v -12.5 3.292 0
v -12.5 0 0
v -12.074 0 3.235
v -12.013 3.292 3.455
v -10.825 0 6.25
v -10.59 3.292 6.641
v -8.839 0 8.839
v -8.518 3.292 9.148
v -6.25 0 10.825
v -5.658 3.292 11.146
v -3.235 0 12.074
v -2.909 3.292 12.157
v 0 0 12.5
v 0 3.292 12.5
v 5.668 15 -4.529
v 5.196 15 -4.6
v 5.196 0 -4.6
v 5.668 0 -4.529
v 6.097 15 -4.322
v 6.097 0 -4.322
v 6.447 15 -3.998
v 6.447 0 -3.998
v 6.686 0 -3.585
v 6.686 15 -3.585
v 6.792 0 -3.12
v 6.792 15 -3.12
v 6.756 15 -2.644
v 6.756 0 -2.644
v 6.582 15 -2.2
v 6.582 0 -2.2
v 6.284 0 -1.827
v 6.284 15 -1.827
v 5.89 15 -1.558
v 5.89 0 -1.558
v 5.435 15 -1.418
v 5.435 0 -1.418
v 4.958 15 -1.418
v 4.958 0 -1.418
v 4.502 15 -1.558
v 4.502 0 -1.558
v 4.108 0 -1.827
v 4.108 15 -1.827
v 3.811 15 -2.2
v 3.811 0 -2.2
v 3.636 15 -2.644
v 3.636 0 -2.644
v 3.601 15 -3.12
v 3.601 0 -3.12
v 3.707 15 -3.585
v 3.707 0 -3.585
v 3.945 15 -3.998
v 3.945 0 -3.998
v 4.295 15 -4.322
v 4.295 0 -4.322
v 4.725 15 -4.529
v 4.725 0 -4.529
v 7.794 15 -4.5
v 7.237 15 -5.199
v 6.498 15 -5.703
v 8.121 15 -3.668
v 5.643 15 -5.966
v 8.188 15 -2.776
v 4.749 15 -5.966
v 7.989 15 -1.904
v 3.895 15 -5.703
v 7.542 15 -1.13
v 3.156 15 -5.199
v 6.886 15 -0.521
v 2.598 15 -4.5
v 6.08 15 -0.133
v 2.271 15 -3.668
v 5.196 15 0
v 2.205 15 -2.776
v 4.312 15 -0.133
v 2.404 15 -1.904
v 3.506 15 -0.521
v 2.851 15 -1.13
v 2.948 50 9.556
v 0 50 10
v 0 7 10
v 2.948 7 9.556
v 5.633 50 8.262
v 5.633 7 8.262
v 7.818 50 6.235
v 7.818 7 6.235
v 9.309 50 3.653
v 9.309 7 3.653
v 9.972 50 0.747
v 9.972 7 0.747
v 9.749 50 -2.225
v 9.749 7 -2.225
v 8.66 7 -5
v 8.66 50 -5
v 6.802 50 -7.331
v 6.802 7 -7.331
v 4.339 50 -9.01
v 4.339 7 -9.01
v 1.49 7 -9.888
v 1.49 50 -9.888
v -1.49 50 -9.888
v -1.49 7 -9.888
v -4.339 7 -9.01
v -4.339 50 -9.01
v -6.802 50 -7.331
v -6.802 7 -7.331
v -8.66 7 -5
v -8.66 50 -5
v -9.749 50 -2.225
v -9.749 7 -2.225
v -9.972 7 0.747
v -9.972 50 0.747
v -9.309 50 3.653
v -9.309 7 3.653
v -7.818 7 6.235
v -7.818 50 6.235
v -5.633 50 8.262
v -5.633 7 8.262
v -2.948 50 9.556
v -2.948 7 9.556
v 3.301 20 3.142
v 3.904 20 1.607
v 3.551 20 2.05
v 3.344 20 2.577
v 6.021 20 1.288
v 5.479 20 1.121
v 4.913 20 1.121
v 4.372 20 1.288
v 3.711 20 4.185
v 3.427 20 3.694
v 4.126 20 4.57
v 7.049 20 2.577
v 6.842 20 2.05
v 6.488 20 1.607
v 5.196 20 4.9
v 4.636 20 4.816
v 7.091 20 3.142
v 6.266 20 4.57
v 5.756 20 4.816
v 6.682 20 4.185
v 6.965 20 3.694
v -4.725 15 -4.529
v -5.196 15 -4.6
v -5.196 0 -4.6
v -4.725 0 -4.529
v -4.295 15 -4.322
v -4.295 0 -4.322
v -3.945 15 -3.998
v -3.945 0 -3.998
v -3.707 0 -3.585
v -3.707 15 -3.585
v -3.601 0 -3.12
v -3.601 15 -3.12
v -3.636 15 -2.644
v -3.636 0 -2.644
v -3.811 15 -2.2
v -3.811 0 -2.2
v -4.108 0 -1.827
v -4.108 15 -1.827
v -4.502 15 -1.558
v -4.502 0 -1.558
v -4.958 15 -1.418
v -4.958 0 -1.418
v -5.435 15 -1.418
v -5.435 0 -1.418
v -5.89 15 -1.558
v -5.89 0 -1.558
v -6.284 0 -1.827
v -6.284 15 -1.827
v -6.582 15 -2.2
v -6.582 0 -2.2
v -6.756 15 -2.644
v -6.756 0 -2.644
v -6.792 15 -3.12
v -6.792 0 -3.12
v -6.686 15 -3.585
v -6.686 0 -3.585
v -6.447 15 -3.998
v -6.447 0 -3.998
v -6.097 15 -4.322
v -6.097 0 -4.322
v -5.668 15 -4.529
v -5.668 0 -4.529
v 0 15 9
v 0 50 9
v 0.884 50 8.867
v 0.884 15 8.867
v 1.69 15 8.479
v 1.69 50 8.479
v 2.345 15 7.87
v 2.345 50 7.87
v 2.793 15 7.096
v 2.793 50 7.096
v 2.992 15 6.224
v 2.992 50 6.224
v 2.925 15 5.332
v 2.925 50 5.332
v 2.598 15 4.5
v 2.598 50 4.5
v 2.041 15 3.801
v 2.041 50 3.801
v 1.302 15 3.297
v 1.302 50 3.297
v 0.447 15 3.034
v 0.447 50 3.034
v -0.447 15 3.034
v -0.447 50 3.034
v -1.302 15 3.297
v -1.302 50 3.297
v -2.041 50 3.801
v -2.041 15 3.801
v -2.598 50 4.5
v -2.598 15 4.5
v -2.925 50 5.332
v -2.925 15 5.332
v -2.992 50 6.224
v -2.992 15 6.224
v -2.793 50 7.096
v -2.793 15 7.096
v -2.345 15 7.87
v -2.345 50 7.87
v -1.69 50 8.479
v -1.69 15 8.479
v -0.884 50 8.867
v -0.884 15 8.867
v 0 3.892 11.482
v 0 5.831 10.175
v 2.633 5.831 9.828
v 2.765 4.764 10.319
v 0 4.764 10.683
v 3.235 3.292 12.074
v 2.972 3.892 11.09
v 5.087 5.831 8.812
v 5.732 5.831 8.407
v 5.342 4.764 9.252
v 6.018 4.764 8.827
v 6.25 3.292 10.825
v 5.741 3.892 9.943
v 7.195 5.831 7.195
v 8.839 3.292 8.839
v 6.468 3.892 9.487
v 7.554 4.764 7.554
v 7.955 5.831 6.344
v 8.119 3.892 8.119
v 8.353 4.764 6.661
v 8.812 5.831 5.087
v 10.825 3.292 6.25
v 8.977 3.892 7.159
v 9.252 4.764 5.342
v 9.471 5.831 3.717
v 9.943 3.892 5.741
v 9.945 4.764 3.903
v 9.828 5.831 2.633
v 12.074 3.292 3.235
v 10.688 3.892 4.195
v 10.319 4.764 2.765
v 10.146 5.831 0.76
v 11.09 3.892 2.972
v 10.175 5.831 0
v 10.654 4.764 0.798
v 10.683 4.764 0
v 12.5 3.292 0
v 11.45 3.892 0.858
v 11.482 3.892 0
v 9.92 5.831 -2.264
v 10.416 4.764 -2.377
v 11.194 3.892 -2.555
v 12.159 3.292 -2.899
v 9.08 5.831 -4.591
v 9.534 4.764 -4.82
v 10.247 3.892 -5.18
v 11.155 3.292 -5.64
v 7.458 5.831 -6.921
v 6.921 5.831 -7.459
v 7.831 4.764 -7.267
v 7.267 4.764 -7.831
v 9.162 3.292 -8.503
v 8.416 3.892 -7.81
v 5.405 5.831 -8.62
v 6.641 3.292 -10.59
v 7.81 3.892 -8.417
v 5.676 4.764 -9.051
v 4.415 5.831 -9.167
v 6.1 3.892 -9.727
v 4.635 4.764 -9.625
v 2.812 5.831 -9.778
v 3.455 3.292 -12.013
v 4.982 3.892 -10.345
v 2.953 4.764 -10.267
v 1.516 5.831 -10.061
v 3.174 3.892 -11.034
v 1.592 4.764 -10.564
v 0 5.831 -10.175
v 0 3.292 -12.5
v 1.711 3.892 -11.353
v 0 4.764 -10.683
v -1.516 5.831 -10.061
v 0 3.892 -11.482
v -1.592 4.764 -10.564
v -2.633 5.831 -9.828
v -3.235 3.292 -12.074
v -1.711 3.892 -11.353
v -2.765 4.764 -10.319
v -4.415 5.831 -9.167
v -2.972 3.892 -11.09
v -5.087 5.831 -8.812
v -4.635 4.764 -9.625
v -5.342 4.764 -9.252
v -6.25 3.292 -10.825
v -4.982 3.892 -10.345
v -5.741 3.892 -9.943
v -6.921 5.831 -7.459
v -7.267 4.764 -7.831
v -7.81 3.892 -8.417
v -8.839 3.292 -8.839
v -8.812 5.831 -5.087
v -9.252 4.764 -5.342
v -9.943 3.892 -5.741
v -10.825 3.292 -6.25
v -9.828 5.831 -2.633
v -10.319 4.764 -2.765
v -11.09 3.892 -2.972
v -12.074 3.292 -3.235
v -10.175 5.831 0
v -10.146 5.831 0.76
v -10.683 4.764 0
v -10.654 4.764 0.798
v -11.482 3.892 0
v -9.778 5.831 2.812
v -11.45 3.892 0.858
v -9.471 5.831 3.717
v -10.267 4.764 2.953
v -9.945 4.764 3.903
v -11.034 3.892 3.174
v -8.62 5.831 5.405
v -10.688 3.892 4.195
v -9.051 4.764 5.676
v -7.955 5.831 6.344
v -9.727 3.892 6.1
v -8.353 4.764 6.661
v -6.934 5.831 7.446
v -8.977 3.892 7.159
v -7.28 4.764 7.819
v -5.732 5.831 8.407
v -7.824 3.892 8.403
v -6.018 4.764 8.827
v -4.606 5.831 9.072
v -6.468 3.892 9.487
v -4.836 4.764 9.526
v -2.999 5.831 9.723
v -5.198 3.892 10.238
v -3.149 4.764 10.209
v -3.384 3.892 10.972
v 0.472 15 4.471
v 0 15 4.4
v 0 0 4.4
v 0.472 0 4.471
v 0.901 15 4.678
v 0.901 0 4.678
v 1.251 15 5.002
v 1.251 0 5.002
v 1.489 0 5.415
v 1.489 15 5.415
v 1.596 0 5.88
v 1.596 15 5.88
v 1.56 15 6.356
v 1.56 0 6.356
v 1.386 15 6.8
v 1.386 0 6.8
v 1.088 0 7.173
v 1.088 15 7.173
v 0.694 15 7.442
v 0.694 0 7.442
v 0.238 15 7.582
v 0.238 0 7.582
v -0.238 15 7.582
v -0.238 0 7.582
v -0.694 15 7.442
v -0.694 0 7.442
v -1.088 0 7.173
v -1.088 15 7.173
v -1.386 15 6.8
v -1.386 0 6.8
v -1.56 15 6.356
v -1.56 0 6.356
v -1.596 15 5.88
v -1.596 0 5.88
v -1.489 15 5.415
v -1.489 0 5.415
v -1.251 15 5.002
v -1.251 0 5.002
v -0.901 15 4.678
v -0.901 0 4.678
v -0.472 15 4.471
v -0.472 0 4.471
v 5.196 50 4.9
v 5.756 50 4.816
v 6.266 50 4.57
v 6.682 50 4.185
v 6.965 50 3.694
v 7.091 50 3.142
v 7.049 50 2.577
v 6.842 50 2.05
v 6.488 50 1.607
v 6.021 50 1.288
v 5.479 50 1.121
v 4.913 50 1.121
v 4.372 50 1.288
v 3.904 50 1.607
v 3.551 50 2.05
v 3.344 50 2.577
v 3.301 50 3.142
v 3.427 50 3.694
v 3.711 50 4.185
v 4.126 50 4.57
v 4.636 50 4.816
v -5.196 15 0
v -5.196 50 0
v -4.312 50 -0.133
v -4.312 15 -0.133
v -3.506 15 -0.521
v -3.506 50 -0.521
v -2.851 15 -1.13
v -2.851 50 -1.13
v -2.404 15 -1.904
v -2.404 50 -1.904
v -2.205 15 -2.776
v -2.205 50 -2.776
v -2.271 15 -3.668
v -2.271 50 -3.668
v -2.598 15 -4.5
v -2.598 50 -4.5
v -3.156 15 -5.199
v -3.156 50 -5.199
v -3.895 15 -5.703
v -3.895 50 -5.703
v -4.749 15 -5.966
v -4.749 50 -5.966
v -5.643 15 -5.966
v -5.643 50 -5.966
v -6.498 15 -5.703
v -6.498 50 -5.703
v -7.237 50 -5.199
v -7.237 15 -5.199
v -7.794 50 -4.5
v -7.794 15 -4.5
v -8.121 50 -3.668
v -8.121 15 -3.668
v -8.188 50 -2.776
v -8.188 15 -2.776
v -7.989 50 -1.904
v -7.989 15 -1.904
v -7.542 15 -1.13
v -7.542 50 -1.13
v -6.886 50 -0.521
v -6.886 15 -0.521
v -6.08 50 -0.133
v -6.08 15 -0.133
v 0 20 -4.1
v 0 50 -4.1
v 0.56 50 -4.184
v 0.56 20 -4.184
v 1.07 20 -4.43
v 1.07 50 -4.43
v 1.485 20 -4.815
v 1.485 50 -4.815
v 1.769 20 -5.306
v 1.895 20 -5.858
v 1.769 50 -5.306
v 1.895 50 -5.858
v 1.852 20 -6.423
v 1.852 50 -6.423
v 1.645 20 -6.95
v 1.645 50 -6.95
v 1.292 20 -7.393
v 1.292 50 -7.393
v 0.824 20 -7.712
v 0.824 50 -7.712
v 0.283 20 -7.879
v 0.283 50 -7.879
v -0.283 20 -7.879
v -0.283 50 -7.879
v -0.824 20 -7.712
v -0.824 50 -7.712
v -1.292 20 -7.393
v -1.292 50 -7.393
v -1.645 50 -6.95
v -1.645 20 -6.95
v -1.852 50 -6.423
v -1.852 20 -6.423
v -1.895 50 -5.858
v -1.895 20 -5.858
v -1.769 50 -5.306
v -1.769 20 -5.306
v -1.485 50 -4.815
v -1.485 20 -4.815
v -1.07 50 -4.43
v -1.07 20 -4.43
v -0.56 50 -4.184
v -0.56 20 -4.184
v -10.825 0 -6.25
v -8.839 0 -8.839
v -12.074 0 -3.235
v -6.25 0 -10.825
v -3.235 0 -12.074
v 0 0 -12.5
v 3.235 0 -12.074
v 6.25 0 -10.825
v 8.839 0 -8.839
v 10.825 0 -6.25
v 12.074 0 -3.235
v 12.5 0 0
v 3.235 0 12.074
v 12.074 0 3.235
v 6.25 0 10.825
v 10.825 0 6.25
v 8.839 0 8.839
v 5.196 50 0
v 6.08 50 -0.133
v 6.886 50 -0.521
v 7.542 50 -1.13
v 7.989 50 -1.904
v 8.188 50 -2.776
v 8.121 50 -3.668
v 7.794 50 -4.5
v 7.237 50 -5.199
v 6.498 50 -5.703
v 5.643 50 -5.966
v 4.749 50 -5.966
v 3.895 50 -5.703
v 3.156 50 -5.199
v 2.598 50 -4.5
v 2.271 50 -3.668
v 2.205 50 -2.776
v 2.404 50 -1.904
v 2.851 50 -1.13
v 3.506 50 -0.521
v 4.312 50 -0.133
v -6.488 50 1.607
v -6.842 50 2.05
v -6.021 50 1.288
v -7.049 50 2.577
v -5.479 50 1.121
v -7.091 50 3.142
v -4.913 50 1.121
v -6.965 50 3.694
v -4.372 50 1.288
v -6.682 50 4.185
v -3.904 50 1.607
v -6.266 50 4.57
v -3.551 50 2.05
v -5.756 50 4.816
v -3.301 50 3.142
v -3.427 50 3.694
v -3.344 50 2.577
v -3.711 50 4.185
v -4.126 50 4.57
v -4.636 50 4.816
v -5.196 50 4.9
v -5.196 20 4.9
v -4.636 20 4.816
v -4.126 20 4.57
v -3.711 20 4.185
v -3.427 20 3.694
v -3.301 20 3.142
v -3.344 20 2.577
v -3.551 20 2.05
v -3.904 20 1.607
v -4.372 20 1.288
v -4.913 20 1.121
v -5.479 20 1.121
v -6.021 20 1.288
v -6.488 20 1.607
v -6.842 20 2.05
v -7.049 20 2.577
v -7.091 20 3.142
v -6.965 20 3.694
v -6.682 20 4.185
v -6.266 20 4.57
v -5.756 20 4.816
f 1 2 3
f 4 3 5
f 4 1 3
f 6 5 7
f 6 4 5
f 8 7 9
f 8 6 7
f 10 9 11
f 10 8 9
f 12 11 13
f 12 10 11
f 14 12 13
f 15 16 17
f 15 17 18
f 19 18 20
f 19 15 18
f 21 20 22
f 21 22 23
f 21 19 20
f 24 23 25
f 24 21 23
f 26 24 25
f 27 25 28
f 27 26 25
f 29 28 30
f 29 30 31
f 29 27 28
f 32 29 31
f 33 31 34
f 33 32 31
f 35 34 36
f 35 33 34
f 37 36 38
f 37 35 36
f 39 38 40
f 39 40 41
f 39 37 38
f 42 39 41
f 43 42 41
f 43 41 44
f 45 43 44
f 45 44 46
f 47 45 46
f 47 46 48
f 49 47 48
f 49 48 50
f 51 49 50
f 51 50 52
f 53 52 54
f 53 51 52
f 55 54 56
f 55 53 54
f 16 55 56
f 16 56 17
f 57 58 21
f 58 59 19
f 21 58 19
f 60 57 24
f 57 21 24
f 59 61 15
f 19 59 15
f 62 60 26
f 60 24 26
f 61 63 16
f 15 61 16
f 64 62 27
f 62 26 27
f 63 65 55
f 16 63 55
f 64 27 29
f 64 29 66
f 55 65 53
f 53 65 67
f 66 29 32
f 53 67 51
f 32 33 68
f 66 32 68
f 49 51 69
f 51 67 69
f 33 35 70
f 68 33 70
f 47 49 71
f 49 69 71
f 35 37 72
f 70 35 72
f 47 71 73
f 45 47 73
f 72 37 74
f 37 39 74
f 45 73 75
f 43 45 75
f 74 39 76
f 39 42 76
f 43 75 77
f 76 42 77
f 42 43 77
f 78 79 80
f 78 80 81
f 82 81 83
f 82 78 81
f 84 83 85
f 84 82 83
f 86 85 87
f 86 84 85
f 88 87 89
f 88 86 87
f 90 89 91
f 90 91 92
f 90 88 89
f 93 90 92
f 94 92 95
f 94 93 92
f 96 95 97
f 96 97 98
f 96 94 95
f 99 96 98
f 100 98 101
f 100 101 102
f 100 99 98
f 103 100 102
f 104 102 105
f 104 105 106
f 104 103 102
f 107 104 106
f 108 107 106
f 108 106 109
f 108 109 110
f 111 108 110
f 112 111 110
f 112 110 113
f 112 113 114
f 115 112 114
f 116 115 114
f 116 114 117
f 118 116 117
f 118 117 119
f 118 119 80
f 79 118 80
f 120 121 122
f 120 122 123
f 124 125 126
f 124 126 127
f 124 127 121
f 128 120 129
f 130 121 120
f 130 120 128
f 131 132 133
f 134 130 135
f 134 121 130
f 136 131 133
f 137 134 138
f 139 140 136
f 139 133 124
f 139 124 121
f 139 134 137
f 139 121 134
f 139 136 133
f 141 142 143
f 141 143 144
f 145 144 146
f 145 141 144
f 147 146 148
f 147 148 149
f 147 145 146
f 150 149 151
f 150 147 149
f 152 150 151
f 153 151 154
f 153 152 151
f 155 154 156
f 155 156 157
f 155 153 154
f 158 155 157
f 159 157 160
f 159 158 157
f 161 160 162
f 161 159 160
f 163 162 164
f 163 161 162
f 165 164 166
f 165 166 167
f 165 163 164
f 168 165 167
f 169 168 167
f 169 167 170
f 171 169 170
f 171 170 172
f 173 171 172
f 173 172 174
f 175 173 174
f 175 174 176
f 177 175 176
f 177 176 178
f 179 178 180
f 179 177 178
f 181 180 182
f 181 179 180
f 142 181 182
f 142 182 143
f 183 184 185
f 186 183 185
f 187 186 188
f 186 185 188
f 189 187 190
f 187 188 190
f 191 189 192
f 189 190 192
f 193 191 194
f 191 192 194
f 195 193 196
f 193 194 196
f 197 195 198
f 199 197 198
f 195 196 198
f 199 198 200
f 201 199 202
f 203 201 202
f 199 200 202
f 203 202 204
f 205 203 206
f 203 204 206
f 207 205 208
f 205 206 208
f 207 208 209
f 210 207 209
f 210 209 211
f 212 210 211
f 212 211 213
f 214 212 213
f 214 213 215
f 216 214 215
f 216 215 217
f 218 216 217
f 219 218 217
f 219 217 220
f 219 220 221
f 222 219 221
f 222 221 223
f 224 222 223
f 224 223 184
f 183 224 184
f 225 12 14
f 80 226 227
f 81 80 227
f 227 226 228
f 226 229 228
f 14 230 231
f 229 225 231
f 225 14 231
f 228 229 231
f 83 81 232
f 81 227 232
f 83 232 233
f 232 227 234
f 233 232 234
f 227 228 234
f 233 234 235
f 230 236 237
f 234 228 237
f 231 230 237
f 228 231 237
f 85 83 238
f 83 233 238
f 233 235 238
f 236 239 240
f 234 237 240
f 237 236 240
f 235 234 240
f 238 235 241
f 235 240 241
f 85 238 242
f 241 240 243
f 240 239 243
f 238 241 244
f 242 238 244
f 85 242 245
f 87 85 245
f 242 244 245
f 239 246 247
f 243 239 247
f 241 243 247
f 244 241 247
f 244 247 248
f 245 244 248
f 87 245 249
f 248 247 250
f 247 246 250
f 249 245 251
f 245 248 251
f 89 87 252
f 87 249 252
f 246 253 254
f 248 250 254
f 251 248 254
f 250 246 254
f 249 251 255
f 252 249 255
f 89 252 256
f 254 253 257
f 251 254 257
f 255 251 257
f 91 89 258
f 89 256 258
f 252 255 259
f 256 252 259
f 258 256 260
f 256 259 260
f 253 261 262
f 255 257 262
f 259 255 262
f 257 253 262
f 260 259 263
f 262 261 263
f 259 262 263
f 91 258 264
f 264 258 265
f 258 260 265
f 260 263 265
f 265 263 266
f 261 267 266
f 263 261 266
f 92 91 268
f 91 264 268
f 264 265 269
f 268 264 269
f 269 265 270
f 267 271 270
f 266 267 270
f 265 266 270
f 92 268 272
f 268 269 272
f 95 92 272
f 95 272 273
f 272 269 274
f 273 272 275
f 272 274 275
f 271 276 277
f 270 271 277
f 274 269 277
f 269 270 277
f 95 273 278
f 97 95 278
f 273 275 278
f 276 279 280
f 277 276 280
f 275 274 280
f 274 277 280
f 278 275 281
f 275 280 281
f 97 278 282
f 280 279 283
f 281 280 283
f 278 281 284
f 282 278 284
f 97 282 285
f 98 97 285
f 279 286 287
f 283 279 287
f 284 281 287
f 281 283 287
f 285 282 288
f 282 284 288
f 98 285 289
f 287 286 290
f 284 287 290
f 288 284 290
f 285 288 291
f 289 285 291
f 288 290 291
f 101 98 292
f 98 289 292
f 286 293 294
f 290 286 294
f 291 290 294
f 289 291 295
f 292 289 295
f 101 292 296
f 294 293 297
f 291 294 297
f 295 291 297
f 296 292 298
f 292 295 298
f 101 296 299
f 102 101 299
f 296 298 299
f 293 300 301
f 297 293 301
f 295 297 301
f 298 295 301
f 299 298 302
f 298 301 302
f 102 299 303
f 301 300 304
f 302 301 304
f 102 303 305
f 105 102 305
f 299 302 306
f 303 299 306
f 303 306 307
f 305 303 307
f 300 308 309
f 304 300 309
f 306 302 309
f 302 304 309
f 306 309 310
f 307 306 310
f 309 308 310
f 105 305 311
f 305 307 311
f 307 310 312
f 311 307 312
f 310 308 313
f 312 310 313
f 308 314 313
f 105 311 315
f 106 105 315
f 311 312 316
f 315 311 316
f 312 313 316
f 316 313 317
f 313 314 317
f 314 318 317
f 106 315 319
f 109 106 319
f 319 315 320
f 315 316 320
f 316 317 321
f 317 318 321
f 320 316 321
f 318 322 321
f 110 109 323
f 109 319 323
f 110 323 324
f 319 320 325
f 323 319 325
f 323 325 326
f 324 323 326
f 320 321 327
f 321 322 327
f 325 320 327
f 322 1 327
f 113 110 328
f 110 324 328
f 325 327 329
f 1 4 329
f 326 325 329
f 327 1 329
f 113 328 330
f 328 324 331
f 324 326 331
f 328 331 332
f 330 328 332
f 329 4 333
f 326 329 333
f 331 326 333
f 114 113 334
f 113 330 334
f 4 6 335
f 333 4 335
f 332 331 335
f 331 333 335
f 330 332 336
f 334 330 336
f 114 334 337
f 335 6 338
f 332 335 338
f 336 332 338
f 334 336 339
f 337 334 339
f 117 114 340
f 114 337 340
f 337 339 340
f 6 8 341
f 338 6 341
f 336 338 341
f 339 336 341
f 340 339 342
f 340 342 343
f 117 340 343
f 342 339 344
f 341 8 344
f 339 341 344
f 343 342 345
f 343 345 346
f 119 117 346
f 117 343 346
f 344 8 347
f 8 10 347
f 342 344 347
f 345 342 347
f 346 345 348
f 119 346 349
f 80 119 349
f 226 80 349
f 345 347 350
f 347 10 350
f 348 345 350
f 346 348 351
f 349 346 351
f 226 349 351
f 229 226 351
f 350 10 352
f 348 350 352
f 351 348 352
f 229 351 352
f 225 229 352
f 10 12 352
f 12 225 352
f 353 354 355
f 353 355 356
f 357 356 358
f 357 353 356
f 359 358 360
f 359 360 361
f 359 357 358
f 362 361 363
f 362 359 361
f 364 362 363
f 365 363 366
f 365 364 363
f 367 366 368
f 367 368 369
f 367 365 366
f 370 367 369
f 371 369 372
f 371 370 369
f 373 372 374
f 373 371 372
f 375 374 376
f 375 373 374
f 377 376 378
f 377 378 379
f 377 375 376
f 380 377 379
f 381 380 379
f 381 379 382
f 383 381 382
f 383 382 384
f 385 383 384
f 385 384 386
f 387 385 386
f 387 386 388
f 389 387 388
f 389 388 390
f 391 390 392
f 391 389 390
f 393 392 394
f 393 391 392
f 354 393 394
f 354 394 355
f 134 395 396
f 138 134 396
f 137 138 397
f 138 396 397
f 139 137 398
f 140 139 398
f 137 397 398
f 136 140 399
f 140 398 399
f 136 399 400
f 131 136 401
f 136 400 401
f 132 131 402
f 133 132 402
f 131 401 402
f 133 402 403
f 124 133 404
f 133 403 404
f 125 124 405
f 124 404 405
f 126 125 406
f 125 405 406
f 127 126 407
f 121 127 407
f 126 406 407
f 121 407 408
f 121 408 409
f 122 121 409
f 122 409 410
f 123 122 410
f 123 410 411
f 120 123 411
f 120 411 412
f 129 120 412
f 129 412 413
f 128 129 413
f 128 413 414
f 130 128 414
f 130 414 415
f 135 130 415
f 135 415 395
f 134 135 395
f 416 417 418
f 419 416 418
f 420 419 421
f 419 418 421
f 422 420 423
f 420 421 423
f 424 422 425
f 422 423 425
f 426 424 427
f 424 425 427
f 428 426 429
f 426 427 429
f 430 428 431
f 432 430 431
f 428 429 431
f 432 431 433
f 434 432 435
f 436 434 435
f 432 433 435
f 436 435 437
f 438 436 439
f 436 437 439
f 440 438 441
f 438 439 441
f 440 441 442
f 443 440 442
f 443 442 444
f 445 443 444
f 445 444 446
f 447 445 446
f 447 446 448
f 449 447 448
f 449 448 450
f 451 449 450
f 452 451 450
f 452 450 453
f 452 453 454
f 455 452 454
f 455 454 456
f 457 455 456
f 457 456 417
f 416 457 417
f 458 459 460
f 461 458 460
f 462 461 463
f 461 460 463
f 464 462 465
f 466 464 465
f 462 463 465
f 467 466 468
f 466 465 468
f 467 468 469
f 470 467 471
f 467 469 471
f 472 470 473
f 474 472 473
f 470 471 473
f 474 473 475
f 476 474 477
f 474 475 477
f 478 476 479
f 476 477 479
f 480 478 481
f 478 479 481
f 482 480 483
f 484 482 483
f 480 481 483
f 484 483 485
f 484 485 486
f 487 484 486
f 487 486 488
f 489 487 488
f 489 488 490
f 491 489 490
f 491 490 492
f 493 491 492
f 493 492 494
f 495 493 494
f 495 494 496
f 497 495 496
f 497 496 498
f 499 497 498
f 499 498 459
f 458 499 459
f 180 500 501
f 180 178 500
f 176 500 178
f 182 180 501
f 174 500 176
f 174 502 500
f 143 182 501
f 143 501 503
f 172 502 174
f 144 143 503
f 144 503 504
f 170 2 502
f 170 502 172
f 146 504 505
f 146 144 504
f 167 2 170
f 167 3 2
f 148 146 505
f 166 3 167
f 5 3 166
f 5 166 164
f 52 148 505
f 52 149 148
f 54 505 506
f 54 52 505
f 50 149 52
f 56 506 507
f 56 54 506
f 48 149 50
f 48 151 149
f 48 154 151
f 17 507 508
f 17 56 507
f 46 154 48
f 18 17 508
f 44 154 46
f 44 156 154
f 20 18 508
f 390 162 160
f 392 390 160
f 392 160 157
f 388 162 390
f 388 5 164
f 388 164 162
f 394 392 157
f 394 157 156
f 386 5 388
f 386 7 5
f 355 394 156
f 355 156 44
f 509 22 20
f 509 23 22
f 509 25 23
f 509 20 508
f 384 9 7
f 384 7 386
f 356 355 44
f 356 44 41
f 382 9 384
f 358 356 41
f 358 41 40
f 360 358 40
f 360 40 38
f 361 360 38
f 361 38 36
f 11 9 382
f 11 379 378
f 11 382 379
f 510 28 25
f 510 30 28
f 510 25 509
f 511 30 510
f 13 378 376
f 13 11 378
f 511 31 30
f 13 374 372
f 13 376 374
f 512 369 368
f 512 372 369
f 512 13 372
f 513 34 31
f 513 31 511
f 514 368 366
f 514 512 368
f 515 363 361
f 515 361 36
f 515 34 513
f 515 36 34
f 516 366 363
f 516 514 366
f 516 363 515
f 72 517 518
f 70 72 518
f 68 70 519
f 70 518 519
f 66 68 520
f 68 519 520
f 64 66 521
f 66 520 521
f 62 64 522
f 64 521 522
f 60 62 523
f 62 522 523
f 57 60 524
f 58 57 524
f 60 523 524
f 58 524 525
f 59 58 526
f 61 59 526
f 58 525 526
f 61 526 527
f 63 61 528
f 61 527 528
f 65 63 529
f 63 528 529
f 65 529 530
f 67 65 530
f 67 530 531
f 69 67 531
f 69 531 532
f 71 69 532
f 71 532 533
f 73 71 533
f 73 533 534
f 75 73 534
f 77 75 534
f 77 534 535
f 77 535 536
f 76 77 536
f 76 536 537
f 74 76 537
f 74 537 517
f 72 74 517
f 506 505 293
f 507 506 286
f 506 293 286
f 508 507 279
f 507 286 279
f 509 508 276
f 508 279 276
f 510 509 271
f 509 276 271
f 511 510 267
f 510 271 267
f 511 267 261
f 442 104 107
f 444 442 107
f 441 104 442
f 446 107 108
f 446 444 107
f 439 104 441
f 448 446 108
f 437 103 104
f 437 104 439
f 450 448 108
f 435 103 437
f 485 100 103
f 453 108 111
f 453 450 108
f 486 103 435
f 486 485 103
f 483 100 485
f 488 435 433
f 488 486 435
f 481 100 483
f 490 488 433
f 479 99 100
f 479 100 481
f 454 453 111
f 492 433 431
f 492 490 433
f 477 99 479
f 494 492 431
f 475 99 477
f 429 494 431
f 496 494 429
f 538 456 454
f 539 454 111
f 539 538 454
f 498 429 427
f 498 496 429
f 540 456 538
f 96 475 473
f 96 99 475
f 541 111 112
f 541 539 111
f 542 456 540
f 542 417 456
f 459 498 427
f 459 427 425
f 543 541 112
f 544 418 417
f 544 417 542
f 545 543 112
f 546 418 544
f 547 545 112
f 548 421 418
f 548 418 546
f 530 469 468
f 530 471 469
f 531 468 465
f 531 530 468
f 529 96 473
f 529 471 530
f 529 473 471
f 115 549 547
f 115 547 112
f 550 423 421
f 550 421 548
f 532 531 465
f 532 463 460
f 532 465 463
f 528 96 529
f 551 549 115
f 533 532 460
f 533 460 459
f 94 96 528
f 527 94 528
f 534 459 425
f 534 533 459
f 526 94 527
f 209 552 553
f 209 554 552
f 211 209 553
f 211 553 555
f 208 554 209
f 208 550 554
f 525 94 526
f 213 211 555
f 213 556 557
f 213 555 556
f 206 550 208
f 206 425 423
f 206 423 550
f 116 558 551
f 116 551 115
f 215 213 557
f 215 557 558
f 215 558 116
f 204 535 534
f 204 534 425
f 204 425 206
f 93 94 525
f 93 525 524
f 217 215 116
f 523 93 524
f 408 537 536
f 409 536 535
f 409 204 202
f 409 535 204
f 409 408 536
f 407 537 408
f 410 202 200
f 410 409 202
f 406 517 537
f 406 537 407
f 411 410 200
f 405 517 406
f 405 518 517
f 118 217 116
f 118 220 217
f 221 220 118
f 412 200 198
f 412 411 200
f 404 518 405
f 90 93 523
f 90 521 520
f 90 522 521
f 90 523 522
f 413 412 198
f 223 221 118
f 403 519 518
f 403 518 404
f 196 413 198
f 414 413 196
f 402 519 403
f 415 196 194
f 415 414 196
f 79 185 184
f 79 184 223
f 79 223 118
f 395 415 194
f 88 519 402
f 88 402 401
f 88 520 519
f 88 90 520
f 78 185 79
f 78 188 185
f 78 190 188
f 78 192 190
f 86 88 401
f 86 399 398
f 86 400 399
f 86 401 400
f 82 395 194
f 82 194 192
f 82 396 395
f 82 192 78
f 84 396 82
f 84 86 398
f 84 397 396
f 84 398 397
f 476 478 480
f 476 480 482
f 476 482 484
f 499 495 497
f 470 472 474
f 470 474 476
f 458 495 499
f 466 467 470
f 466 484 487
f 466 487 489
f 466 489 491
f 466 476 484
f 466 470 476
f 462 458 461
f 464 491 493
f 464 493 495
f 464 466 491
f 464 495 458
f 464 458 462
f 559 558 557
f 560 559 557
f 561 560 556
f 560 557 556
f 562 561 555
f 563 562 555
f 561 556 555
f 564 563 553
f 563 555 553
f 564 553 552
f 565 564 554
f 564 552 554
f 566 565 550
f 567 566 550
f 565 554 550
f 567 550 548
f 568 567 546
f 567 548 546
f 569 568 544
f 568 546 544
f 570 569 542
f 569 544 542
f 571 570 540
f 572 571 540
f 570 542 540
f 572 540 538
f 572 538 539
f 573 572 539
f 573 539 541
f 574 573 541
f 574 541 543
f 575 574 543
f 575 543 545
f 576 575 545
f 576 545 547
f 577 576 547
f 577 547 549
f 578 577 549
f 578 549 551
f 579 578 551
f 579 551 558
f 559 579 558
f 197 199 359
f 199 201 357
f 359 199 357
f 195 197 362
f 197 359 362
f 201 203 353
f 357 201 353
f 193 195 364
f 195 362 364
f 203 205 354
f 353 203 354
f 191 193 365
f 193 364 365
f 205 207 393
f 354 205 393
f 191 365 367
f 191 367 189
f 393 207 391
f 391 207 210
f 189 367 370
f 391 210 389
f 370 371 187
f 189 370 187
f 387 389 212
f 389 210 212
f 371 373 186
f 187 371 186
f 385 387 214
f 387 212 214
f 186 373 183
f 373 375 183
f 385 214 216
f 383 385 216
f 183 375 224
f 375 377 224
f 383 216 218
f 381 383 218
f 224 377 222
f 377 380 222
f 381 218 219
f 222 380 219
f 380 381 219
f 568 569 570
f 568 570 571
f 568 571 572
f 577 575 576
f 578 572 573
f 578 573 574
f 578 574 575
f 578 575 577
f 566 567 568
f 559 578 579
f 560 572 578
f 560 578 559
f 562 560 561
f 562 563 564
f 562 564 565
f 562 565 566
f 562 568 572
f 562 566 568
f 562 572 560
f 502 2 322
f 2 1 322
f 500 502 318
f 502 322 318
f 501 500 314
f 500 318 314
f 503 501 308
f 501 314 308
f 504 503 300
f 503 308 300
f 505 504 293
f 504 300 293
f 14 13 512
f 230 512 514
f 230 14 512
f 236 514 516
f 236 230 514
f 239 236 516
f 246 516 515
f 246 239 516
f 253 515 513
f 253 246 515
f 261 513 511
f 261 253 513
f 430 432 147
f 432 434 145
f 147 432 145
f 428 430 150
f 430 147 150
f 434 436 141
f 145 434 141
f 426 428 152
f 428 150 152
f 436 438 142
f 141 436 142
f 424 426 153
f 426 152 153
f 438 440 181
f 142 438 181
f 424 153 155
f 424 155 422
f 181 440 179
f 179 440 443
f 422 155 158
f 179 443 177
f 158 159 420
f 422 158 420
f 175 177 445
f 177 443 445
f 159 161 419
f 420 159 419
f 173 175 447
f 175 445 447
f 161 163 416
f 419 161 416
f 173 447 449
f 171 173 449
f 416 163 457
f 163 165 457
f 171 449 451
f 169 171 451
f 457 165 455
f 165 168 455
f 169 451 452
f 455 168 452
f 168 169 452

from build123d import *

# Parameters (mm, degrees)
SKETCH_1_R          = 10
EXTRUDE_1_DEPTH     = 30
SKETCH_2_R          = 1.85
CUT_EXTRUDE_1_DEPTH = 34.166247904
SKETCH_3_R          = 1.85
SKETCH_3_R_2        = 1.6
EXTRUDE_2_DEPTH     = 15
CUT_EXTRUDE_START   = -15
SKETCH_4_R          = 2.5
SKETCH_4_R_2        = 1.85
CUT_EXTRUDE_2_DEPTH = 15
EXTRUDE_START       = -15
SKETCH_5_R          = 1.85
SKETCH_5_R_2        = 1.6
EXTRUDE_3_DEPTH     = 15
SKETCH_6_R          = 2.5
CUT_EXTRUDE_4_DEPTH = 15
SKETCH_8_W          = 25
SKETCH_8_H          = 25
SKETCH_8_R          = 10
EXTRUDE_4_DEPTH     = 3
FILLET_1_R          = 4
FILLET_6_R          = 12.5
FILLET_7_R          = 12.5
FILLET_8_R          = 12.5
FILLET_9_R          = 12.5
EXTRUDE_START_2     = -25
SKETCH_9_R          = 2.5
EXTRUDE_6_DEPTH     = 25
SKETCH_10_R         = 1.9
CUT_EXTRUDE_5_DEPTH = 10
SKETCH_11_R         = 3
CUT_EXTRUDE_6_DEPTH = 15
EXTRUDE_START_3     = 20
SKETCH_13_R         = 10
SKETCH_13_R_2       = 3
SKETCH_13_R_3       = 1.9
EXTRUDE_7_DEPTH     = 20


# Some blends are built 0.0001 mm under size
with BuildPart() as part:
    # 草图1 → 凸台-拉伸1 (new body)
    with BuildSketch(Plane(origin=(0, 0, 0), x_dir=(1, 0, 0), z_dir=(0, 1, 0))):
        with Locations(Location((0, 0, 0), (0, 0, 270))):
            Circle(SKETCH_1_R)
    extrude(amount=EXTRUDE_1_DEPTH)

    # 草图2 → 切除-拉伸1 (cut, through all)
    with BuildSketch(Plane(origin=(0, 30, 0), x_dir=(1, 0, 0), z_dir=(0, 1, 0))):
        with Locations(Location((0, 6, 0), (0, 0, 270))):
            Circle(SKETCH_2_R)
        with Locations(Location((5.196152423, 3, 0), (0, 0, 270))):
            Circle(SKETCH_2_R)
        with Locations(Location((5.196152423, -3, 0), (0, 0, 270))):
            Circle(SKETCH_2_R)
        with Locations(Location((0, -6, 0), (0, 0, 270))):
            Circle(SKETCH_2_R)
        with Locations(Location((-5.196152423, -3, 0), (0, 0, 270))):
            Circle(SKETCH_2_R)
        with Locations(Location((-5.196152423, 3, 0), (0, 0, 270))):
            Circle(SKETCH_2_R)
    extrude(amount=-CUT_EXTRUDE_1_DEPTH, mode=Mode.SUBTRACT)

    # 草图3 → 凸台-拉伸2 (add)
    # profile 1 of 3: a face of its own
    with BuildSketch(Plane(origin=(0, 30, 0), x_dir=(1, 0, 0), z_dir=(0, 1, 0))):
        with Locations(Location((0, 6, 0), (0, 0, 270))):
            Circle(SKETCH_3_R)
        with Locations(Location((0, 6, 0), (0, 0, 270))):
            Circle(SKETCH_3_R_2, mode=Mode.SUBTRACT)
    # profile 2 of 3: a face of its own
    with BuildSketch(Plane(origin=(0, 30, 0), x_dir=(1, 0, 0), z_dir=(0, 1, 0))):
        with Locations(Location((-5.196152423, -3, 0), (0, 0, 270))):
            Circle(SKETCH_3_R)
        with Locations(Location((-5.196152423, -3, 0), (0, 0, 270))):
            Circle(SKETCH_3_R_2, mode=Mode.SUBTRACT)
    # profile 3 of 3: a face of its own
    with BuildSketch(Plane(origin=(0, 30, 0), x_dir=(1, 0, 0), z_dir=(0, 1, 0))):
        with Locations(Location((5.196152423, -3, 0), (0, 0, 270))):
            Circle(SKETCH_3_R)
        with Locations(Location((5.196152423, -3, 0), (0, 0, 270))):
            Circle(SKETCH_3_R_2, mode=Mode.SUBTRACT)
    extrude(amount=-EXTRUDE_2_DEPTH)

    # 草图4 → 切除-拉伸2 (cut)
    # profile 1 of 3: a face of its own
    with BuildSketch(Plane.XZ.offset(CUT_EXTRUDE_START)):
        with Locations(Location((-5.196152423, 3, 0), (0, 0, 270))):
            Circle(SKETCH_4_R)
        with Locations((-5.196152423, 3)):
            Circle(SKETCH_4_R_2, mode=Mode.SUBTRACT)
    # profile 2 of 3: a face of its own
    with BuildSketch(Plane.XZ.offset(CUT_EXTRUDE_START)):
        with Locations(Location((5.196152423, 3, 0), (0, 0, 270))):
            Circle(SKETCH_4_R)
        with Locations((5.196152423, 3)):
            Circle(SKETCH_4_R_2, mode=Mode.SUBTRACT)
    # profile 3 of 3: a face of its own
    with BuildSketch(Plane.XZ.offset(CUT_EXTRUDE_START)):
        with Locations(Location((0, -6, 0), (0, 0, 270))):
            Circle(SKETCH_4_R)
        with Locations((0, -6)):
            Circle(SKETCH_4_R_2, mode=Mode.SUBTRACT)
    extrude(amount=CUT_EXTRUDE_2_DEPTH, mode=Mode.SUBTRACT)

    # 草图5 → 凸台-拉伸3 (add)
    # profile 1 of 3: a face of its own
    with BuildSketch(Plane.XZ.offset(EXTRUDE_START)):
        with Locations(Location((0, 6, 0), (0, 0, 90))):
            Circle(SKETCH_5_R)
        with Locations(Location((0, 6, 0), (0, 0, 270))):
            Circle(SKETCH_5_R_2, mode=Mode.SUBTRACT)
    # profile 2 of 3: a face of its own
    with BuildSketch(Plane.XZ.offset(EXTRUDE_START)):
        with Locations(Location((-5.196152423, -3, 0), (0, 0, 90))):
            Circle(SKETCH_5_R)
        with Locations(Location((-5.196152423, -3, 0), (0, 0, 270))):
            Circle(SKETCH_5_R_2, mode=Mode.SUBTRACT)
    # profile 3 of 3: a face of its own
    with BuildSketch(Plane.XZ.offset(EXTRUDE_START)):
        with Locations(Location((5.196152423, -3, 0), (0, 0, 90))):
            Circle(SKETCH_5_R)
        with Locations(Location((5.196152423, -3, 0), (0, 0, 270))):
            Circle(SKETCH_5_R_2, mode=Mode.SUBTRACT)
    extrude(amount=EXTRUDE_3_DEPTH)

    # 草图6 → 切除-拉伸4 (cut)
    with BuildSketch(Plane(origin=(0, 30, 0), x_dir=(1, 0, 0), z_dir=(0, 1, 0))):
        with Locations(Location((-5.196152423, 3, 0), (0, 0, 270))):
            Circle(SKETCH_6_R)
        with Locations(Location((5.196152423, 3, 0), (0, 0, 270))):
            Circle(SKETCH_6_R)
        with Locations(Location((0, -6, 0), (0, 0, 270))):
            Circle(SKETCH_6_R)
    extrude(amount=-CUT_EXTRUDE_4_DEPTH, mode=Mode.SUBTRACT)

    # 草图8 → 凸台-拉伸4 (add)
    with BuildSketch(Plane.XZ):
        Rectangle(SKETCH_8_W, SKETCH_8_H)
        with Locations(Location((0, 0, 0), (0, 0, 270))):
            Circle(SKETCH_8_R, mode=Mode.SUBTRACT)
    extrude(amount=-EXTRUDE_4_DEPTH)

    # 圆角1
    # the kernel refuses this fillet: 4 mm, written as the material it adds along each edge
    with BuildSketch(Plane(origin=(0, 3, 0), x_dir=(0, 0, 1), z_dir=(-1, 0, 0))) as fillet_1_piece_1_section:
        with BuildLine():
            CenterArc((10 + FILLET_1_R, FILLET_1_R), FILLET_1_R, 180, 90)
            Line((10 + FILLET_1_R, 0), (10, 0))
            Line((10, 0), (10, FILLET_1_R))
        make_face()
    fillet_1_piece_1 = revolve(axis=Axis((0, 3, 0), (0, 1, 0)), mode=Mode.PRIVATE)
    fillet_1_piece_1 = split(fillet_1_piece_1, bisect_by=Plane(origin=(-12.5, 4.125745955, -11.125745955), z_dir=(1, 0, 0)), keep=Keep.TOP, mode=Mode.PRIVATE)
    fillet_1_piece_1 = split(fillet_1_piece_1, bisect_by=Plane(origin=(0, 4.125745955, 12.5), z_dir=(0, 0, -1)), keep=Keep.TOP, mode=Mode.PRIVATE)
    fillet_1_piece_1 = split(fillet_1_piece_1, bisect_by=Plane(origin=(12.5, 4.125745955, -11.125745955), z_dir=(-1, 0, 0)), keep=Keep.TOP, mode=Mode.PRIVATE)
    fillet_1_piece_1 = split(fillet_1_piece_1, bisect_by=Plane(origin=(0, 4.125745955, -12.5), z_dir=(0, 0, 1)), keep=Keep.TOP, mode=Mode.PRIVATE)
    add(fillet_1_piece_1)

    # 圆角6
    fillet_6_edges = [part.edges().sort_by_distance(p)[0] for p in [
        (12.5, 1.5, 12.5),
    ]]
    fillet(fillet_6_edges, radius=FILLET_6_R)

    # 圆角7
    fillet_7_edges = [part.edges().sort_by_distance(p)[0] for p in [
        (-12.5, 1.5, 12.5),
    ]]
    fillet(fillet_7_edges, radius=FILLET_7_R - 0.0001)  # a hair under: the kernel refuses the full size

    # 圆角8
    fillet_8_edges = [part.edges().sort_by_distance(p)[0] for p in [
        (-12.5, 1.5, -12.5),
    ]]
    fillet(fillet_8_edges, radius=FILLET_8_R)

    # 圆角9
    fillet_9_edges = [part.edges().sort_by_distance(p)[0] for p in [
        (12.5, 1.5, -12.5),
    ]]
    fillet(fillet_9_edges, radius=FILLET_9_R - 0.0001)  # a hair under: the kernel refuses the full size

    # 草图9 → 凸台-拉伸6 (add)
    with BuildSketch(Plane.XZ.offset(EXTRUDE_START_2)):
        with Locations((5.196152423, 3)):
            Circle(SKETCH_9_R)
        with Locations((-5.196152423, 3)):
            Circle(SKETCH_9_R)
        with Locations((0, -6)):
            Circle(SKETCH_9_R)
    extrude(amount=EXTRUDE_6_DEPTH)

    # 草图10 → 切除-拉伸5 (cut)
    with BuildSketch(Plane(origin=(0, 30, 0), x_dir=(1, 0, 0), z_dir=(0, 1, 0))):
        with Locations(Location((0, 6, 0), (0, 0, 270))):
            Circle(SKETCH_10_R)
        with Locations(Location((-5.196152423, -3, 0), (0, 0, 270))):
            Circle(SKETCH_10_R)
        with Locations(Location((5.196152423, -3, 0), (0, 0, 270))):
            Circle(SKETCH_10_R)
    extrude(amount=-CUT_EXTRUDE_5_DEPTH, mode=Mode.SUBTRACT)

    # 草图11 → 切除-拉伸6 (cut)
    with BuildSketch(Plane(origin=(0, 30, 0), x_dir=(1, 0, 0), z_dir=(0, 1, 0))):
        with Locations(Location((-5.196152423, 3, 0), (0, 0, 270))):
            Circle(SKETCH_11_R)
        with Locations(Location((5.196152423, 3, 0), (0, 0, 270))):
            Circle(SKETCH_11_R)
        with Locations(Location((0, -6, 0), (0, 0, 270))):
            Circle(SKETCH_11_R)
    extrude(amount=-CUT_EXTRUDE_6_DEPTH, mode=Mode.SUBTRACT)

    # 草图13 → 凸台-拉伸7 (add)
    with BuildSketch(Plane(origin=(0, 30, 0), x_dir=(1, 0, 0), z_dir=(0, 1, 0)).offset(EXTRUDE_START_3)):
        with Locations(Location((0, 0, 0), (0, 0, 270))):
            Circle(SKETCH_13_R)
        with Locations(Location((-5.196152423, 3, 0), (0, 0, 270))):
            Circle(SKETCH_13_R_2, mode=Mode.SUBTRACT)
        with Locations(Location((0, 6, 0), (0, 0, 270))):
            Circle(SKETCH_13_R_3, mode=Mode.SUBTRACT)
        with Locations(Location((5.196152423, 3, 0), (0, 0, 270))):
            Circle(SKETCH_13_R_2, mode=Mode.SUBTRACT)
        with Locations(Location((0, -6, 0), (0, 0, 270))):
            Circle(SKETCH_13_R_2, mode=Mode.SUBTRACT)
        with Locations(Location((5.196152423, -3, 0), (0, 0, 270))):
            Circle(SKETCH_13_R_3, mode=Mode.SUBTRACT)
        with Locations(Location((-5.196152423, -3, 0), (0, 0, 270))):
            Circle(SKETCH_13_R_3, mode=Mode.SUBTRACT)
    extrude(amount=-EXTRUDE_7_DEPTH)


solid = part.part
